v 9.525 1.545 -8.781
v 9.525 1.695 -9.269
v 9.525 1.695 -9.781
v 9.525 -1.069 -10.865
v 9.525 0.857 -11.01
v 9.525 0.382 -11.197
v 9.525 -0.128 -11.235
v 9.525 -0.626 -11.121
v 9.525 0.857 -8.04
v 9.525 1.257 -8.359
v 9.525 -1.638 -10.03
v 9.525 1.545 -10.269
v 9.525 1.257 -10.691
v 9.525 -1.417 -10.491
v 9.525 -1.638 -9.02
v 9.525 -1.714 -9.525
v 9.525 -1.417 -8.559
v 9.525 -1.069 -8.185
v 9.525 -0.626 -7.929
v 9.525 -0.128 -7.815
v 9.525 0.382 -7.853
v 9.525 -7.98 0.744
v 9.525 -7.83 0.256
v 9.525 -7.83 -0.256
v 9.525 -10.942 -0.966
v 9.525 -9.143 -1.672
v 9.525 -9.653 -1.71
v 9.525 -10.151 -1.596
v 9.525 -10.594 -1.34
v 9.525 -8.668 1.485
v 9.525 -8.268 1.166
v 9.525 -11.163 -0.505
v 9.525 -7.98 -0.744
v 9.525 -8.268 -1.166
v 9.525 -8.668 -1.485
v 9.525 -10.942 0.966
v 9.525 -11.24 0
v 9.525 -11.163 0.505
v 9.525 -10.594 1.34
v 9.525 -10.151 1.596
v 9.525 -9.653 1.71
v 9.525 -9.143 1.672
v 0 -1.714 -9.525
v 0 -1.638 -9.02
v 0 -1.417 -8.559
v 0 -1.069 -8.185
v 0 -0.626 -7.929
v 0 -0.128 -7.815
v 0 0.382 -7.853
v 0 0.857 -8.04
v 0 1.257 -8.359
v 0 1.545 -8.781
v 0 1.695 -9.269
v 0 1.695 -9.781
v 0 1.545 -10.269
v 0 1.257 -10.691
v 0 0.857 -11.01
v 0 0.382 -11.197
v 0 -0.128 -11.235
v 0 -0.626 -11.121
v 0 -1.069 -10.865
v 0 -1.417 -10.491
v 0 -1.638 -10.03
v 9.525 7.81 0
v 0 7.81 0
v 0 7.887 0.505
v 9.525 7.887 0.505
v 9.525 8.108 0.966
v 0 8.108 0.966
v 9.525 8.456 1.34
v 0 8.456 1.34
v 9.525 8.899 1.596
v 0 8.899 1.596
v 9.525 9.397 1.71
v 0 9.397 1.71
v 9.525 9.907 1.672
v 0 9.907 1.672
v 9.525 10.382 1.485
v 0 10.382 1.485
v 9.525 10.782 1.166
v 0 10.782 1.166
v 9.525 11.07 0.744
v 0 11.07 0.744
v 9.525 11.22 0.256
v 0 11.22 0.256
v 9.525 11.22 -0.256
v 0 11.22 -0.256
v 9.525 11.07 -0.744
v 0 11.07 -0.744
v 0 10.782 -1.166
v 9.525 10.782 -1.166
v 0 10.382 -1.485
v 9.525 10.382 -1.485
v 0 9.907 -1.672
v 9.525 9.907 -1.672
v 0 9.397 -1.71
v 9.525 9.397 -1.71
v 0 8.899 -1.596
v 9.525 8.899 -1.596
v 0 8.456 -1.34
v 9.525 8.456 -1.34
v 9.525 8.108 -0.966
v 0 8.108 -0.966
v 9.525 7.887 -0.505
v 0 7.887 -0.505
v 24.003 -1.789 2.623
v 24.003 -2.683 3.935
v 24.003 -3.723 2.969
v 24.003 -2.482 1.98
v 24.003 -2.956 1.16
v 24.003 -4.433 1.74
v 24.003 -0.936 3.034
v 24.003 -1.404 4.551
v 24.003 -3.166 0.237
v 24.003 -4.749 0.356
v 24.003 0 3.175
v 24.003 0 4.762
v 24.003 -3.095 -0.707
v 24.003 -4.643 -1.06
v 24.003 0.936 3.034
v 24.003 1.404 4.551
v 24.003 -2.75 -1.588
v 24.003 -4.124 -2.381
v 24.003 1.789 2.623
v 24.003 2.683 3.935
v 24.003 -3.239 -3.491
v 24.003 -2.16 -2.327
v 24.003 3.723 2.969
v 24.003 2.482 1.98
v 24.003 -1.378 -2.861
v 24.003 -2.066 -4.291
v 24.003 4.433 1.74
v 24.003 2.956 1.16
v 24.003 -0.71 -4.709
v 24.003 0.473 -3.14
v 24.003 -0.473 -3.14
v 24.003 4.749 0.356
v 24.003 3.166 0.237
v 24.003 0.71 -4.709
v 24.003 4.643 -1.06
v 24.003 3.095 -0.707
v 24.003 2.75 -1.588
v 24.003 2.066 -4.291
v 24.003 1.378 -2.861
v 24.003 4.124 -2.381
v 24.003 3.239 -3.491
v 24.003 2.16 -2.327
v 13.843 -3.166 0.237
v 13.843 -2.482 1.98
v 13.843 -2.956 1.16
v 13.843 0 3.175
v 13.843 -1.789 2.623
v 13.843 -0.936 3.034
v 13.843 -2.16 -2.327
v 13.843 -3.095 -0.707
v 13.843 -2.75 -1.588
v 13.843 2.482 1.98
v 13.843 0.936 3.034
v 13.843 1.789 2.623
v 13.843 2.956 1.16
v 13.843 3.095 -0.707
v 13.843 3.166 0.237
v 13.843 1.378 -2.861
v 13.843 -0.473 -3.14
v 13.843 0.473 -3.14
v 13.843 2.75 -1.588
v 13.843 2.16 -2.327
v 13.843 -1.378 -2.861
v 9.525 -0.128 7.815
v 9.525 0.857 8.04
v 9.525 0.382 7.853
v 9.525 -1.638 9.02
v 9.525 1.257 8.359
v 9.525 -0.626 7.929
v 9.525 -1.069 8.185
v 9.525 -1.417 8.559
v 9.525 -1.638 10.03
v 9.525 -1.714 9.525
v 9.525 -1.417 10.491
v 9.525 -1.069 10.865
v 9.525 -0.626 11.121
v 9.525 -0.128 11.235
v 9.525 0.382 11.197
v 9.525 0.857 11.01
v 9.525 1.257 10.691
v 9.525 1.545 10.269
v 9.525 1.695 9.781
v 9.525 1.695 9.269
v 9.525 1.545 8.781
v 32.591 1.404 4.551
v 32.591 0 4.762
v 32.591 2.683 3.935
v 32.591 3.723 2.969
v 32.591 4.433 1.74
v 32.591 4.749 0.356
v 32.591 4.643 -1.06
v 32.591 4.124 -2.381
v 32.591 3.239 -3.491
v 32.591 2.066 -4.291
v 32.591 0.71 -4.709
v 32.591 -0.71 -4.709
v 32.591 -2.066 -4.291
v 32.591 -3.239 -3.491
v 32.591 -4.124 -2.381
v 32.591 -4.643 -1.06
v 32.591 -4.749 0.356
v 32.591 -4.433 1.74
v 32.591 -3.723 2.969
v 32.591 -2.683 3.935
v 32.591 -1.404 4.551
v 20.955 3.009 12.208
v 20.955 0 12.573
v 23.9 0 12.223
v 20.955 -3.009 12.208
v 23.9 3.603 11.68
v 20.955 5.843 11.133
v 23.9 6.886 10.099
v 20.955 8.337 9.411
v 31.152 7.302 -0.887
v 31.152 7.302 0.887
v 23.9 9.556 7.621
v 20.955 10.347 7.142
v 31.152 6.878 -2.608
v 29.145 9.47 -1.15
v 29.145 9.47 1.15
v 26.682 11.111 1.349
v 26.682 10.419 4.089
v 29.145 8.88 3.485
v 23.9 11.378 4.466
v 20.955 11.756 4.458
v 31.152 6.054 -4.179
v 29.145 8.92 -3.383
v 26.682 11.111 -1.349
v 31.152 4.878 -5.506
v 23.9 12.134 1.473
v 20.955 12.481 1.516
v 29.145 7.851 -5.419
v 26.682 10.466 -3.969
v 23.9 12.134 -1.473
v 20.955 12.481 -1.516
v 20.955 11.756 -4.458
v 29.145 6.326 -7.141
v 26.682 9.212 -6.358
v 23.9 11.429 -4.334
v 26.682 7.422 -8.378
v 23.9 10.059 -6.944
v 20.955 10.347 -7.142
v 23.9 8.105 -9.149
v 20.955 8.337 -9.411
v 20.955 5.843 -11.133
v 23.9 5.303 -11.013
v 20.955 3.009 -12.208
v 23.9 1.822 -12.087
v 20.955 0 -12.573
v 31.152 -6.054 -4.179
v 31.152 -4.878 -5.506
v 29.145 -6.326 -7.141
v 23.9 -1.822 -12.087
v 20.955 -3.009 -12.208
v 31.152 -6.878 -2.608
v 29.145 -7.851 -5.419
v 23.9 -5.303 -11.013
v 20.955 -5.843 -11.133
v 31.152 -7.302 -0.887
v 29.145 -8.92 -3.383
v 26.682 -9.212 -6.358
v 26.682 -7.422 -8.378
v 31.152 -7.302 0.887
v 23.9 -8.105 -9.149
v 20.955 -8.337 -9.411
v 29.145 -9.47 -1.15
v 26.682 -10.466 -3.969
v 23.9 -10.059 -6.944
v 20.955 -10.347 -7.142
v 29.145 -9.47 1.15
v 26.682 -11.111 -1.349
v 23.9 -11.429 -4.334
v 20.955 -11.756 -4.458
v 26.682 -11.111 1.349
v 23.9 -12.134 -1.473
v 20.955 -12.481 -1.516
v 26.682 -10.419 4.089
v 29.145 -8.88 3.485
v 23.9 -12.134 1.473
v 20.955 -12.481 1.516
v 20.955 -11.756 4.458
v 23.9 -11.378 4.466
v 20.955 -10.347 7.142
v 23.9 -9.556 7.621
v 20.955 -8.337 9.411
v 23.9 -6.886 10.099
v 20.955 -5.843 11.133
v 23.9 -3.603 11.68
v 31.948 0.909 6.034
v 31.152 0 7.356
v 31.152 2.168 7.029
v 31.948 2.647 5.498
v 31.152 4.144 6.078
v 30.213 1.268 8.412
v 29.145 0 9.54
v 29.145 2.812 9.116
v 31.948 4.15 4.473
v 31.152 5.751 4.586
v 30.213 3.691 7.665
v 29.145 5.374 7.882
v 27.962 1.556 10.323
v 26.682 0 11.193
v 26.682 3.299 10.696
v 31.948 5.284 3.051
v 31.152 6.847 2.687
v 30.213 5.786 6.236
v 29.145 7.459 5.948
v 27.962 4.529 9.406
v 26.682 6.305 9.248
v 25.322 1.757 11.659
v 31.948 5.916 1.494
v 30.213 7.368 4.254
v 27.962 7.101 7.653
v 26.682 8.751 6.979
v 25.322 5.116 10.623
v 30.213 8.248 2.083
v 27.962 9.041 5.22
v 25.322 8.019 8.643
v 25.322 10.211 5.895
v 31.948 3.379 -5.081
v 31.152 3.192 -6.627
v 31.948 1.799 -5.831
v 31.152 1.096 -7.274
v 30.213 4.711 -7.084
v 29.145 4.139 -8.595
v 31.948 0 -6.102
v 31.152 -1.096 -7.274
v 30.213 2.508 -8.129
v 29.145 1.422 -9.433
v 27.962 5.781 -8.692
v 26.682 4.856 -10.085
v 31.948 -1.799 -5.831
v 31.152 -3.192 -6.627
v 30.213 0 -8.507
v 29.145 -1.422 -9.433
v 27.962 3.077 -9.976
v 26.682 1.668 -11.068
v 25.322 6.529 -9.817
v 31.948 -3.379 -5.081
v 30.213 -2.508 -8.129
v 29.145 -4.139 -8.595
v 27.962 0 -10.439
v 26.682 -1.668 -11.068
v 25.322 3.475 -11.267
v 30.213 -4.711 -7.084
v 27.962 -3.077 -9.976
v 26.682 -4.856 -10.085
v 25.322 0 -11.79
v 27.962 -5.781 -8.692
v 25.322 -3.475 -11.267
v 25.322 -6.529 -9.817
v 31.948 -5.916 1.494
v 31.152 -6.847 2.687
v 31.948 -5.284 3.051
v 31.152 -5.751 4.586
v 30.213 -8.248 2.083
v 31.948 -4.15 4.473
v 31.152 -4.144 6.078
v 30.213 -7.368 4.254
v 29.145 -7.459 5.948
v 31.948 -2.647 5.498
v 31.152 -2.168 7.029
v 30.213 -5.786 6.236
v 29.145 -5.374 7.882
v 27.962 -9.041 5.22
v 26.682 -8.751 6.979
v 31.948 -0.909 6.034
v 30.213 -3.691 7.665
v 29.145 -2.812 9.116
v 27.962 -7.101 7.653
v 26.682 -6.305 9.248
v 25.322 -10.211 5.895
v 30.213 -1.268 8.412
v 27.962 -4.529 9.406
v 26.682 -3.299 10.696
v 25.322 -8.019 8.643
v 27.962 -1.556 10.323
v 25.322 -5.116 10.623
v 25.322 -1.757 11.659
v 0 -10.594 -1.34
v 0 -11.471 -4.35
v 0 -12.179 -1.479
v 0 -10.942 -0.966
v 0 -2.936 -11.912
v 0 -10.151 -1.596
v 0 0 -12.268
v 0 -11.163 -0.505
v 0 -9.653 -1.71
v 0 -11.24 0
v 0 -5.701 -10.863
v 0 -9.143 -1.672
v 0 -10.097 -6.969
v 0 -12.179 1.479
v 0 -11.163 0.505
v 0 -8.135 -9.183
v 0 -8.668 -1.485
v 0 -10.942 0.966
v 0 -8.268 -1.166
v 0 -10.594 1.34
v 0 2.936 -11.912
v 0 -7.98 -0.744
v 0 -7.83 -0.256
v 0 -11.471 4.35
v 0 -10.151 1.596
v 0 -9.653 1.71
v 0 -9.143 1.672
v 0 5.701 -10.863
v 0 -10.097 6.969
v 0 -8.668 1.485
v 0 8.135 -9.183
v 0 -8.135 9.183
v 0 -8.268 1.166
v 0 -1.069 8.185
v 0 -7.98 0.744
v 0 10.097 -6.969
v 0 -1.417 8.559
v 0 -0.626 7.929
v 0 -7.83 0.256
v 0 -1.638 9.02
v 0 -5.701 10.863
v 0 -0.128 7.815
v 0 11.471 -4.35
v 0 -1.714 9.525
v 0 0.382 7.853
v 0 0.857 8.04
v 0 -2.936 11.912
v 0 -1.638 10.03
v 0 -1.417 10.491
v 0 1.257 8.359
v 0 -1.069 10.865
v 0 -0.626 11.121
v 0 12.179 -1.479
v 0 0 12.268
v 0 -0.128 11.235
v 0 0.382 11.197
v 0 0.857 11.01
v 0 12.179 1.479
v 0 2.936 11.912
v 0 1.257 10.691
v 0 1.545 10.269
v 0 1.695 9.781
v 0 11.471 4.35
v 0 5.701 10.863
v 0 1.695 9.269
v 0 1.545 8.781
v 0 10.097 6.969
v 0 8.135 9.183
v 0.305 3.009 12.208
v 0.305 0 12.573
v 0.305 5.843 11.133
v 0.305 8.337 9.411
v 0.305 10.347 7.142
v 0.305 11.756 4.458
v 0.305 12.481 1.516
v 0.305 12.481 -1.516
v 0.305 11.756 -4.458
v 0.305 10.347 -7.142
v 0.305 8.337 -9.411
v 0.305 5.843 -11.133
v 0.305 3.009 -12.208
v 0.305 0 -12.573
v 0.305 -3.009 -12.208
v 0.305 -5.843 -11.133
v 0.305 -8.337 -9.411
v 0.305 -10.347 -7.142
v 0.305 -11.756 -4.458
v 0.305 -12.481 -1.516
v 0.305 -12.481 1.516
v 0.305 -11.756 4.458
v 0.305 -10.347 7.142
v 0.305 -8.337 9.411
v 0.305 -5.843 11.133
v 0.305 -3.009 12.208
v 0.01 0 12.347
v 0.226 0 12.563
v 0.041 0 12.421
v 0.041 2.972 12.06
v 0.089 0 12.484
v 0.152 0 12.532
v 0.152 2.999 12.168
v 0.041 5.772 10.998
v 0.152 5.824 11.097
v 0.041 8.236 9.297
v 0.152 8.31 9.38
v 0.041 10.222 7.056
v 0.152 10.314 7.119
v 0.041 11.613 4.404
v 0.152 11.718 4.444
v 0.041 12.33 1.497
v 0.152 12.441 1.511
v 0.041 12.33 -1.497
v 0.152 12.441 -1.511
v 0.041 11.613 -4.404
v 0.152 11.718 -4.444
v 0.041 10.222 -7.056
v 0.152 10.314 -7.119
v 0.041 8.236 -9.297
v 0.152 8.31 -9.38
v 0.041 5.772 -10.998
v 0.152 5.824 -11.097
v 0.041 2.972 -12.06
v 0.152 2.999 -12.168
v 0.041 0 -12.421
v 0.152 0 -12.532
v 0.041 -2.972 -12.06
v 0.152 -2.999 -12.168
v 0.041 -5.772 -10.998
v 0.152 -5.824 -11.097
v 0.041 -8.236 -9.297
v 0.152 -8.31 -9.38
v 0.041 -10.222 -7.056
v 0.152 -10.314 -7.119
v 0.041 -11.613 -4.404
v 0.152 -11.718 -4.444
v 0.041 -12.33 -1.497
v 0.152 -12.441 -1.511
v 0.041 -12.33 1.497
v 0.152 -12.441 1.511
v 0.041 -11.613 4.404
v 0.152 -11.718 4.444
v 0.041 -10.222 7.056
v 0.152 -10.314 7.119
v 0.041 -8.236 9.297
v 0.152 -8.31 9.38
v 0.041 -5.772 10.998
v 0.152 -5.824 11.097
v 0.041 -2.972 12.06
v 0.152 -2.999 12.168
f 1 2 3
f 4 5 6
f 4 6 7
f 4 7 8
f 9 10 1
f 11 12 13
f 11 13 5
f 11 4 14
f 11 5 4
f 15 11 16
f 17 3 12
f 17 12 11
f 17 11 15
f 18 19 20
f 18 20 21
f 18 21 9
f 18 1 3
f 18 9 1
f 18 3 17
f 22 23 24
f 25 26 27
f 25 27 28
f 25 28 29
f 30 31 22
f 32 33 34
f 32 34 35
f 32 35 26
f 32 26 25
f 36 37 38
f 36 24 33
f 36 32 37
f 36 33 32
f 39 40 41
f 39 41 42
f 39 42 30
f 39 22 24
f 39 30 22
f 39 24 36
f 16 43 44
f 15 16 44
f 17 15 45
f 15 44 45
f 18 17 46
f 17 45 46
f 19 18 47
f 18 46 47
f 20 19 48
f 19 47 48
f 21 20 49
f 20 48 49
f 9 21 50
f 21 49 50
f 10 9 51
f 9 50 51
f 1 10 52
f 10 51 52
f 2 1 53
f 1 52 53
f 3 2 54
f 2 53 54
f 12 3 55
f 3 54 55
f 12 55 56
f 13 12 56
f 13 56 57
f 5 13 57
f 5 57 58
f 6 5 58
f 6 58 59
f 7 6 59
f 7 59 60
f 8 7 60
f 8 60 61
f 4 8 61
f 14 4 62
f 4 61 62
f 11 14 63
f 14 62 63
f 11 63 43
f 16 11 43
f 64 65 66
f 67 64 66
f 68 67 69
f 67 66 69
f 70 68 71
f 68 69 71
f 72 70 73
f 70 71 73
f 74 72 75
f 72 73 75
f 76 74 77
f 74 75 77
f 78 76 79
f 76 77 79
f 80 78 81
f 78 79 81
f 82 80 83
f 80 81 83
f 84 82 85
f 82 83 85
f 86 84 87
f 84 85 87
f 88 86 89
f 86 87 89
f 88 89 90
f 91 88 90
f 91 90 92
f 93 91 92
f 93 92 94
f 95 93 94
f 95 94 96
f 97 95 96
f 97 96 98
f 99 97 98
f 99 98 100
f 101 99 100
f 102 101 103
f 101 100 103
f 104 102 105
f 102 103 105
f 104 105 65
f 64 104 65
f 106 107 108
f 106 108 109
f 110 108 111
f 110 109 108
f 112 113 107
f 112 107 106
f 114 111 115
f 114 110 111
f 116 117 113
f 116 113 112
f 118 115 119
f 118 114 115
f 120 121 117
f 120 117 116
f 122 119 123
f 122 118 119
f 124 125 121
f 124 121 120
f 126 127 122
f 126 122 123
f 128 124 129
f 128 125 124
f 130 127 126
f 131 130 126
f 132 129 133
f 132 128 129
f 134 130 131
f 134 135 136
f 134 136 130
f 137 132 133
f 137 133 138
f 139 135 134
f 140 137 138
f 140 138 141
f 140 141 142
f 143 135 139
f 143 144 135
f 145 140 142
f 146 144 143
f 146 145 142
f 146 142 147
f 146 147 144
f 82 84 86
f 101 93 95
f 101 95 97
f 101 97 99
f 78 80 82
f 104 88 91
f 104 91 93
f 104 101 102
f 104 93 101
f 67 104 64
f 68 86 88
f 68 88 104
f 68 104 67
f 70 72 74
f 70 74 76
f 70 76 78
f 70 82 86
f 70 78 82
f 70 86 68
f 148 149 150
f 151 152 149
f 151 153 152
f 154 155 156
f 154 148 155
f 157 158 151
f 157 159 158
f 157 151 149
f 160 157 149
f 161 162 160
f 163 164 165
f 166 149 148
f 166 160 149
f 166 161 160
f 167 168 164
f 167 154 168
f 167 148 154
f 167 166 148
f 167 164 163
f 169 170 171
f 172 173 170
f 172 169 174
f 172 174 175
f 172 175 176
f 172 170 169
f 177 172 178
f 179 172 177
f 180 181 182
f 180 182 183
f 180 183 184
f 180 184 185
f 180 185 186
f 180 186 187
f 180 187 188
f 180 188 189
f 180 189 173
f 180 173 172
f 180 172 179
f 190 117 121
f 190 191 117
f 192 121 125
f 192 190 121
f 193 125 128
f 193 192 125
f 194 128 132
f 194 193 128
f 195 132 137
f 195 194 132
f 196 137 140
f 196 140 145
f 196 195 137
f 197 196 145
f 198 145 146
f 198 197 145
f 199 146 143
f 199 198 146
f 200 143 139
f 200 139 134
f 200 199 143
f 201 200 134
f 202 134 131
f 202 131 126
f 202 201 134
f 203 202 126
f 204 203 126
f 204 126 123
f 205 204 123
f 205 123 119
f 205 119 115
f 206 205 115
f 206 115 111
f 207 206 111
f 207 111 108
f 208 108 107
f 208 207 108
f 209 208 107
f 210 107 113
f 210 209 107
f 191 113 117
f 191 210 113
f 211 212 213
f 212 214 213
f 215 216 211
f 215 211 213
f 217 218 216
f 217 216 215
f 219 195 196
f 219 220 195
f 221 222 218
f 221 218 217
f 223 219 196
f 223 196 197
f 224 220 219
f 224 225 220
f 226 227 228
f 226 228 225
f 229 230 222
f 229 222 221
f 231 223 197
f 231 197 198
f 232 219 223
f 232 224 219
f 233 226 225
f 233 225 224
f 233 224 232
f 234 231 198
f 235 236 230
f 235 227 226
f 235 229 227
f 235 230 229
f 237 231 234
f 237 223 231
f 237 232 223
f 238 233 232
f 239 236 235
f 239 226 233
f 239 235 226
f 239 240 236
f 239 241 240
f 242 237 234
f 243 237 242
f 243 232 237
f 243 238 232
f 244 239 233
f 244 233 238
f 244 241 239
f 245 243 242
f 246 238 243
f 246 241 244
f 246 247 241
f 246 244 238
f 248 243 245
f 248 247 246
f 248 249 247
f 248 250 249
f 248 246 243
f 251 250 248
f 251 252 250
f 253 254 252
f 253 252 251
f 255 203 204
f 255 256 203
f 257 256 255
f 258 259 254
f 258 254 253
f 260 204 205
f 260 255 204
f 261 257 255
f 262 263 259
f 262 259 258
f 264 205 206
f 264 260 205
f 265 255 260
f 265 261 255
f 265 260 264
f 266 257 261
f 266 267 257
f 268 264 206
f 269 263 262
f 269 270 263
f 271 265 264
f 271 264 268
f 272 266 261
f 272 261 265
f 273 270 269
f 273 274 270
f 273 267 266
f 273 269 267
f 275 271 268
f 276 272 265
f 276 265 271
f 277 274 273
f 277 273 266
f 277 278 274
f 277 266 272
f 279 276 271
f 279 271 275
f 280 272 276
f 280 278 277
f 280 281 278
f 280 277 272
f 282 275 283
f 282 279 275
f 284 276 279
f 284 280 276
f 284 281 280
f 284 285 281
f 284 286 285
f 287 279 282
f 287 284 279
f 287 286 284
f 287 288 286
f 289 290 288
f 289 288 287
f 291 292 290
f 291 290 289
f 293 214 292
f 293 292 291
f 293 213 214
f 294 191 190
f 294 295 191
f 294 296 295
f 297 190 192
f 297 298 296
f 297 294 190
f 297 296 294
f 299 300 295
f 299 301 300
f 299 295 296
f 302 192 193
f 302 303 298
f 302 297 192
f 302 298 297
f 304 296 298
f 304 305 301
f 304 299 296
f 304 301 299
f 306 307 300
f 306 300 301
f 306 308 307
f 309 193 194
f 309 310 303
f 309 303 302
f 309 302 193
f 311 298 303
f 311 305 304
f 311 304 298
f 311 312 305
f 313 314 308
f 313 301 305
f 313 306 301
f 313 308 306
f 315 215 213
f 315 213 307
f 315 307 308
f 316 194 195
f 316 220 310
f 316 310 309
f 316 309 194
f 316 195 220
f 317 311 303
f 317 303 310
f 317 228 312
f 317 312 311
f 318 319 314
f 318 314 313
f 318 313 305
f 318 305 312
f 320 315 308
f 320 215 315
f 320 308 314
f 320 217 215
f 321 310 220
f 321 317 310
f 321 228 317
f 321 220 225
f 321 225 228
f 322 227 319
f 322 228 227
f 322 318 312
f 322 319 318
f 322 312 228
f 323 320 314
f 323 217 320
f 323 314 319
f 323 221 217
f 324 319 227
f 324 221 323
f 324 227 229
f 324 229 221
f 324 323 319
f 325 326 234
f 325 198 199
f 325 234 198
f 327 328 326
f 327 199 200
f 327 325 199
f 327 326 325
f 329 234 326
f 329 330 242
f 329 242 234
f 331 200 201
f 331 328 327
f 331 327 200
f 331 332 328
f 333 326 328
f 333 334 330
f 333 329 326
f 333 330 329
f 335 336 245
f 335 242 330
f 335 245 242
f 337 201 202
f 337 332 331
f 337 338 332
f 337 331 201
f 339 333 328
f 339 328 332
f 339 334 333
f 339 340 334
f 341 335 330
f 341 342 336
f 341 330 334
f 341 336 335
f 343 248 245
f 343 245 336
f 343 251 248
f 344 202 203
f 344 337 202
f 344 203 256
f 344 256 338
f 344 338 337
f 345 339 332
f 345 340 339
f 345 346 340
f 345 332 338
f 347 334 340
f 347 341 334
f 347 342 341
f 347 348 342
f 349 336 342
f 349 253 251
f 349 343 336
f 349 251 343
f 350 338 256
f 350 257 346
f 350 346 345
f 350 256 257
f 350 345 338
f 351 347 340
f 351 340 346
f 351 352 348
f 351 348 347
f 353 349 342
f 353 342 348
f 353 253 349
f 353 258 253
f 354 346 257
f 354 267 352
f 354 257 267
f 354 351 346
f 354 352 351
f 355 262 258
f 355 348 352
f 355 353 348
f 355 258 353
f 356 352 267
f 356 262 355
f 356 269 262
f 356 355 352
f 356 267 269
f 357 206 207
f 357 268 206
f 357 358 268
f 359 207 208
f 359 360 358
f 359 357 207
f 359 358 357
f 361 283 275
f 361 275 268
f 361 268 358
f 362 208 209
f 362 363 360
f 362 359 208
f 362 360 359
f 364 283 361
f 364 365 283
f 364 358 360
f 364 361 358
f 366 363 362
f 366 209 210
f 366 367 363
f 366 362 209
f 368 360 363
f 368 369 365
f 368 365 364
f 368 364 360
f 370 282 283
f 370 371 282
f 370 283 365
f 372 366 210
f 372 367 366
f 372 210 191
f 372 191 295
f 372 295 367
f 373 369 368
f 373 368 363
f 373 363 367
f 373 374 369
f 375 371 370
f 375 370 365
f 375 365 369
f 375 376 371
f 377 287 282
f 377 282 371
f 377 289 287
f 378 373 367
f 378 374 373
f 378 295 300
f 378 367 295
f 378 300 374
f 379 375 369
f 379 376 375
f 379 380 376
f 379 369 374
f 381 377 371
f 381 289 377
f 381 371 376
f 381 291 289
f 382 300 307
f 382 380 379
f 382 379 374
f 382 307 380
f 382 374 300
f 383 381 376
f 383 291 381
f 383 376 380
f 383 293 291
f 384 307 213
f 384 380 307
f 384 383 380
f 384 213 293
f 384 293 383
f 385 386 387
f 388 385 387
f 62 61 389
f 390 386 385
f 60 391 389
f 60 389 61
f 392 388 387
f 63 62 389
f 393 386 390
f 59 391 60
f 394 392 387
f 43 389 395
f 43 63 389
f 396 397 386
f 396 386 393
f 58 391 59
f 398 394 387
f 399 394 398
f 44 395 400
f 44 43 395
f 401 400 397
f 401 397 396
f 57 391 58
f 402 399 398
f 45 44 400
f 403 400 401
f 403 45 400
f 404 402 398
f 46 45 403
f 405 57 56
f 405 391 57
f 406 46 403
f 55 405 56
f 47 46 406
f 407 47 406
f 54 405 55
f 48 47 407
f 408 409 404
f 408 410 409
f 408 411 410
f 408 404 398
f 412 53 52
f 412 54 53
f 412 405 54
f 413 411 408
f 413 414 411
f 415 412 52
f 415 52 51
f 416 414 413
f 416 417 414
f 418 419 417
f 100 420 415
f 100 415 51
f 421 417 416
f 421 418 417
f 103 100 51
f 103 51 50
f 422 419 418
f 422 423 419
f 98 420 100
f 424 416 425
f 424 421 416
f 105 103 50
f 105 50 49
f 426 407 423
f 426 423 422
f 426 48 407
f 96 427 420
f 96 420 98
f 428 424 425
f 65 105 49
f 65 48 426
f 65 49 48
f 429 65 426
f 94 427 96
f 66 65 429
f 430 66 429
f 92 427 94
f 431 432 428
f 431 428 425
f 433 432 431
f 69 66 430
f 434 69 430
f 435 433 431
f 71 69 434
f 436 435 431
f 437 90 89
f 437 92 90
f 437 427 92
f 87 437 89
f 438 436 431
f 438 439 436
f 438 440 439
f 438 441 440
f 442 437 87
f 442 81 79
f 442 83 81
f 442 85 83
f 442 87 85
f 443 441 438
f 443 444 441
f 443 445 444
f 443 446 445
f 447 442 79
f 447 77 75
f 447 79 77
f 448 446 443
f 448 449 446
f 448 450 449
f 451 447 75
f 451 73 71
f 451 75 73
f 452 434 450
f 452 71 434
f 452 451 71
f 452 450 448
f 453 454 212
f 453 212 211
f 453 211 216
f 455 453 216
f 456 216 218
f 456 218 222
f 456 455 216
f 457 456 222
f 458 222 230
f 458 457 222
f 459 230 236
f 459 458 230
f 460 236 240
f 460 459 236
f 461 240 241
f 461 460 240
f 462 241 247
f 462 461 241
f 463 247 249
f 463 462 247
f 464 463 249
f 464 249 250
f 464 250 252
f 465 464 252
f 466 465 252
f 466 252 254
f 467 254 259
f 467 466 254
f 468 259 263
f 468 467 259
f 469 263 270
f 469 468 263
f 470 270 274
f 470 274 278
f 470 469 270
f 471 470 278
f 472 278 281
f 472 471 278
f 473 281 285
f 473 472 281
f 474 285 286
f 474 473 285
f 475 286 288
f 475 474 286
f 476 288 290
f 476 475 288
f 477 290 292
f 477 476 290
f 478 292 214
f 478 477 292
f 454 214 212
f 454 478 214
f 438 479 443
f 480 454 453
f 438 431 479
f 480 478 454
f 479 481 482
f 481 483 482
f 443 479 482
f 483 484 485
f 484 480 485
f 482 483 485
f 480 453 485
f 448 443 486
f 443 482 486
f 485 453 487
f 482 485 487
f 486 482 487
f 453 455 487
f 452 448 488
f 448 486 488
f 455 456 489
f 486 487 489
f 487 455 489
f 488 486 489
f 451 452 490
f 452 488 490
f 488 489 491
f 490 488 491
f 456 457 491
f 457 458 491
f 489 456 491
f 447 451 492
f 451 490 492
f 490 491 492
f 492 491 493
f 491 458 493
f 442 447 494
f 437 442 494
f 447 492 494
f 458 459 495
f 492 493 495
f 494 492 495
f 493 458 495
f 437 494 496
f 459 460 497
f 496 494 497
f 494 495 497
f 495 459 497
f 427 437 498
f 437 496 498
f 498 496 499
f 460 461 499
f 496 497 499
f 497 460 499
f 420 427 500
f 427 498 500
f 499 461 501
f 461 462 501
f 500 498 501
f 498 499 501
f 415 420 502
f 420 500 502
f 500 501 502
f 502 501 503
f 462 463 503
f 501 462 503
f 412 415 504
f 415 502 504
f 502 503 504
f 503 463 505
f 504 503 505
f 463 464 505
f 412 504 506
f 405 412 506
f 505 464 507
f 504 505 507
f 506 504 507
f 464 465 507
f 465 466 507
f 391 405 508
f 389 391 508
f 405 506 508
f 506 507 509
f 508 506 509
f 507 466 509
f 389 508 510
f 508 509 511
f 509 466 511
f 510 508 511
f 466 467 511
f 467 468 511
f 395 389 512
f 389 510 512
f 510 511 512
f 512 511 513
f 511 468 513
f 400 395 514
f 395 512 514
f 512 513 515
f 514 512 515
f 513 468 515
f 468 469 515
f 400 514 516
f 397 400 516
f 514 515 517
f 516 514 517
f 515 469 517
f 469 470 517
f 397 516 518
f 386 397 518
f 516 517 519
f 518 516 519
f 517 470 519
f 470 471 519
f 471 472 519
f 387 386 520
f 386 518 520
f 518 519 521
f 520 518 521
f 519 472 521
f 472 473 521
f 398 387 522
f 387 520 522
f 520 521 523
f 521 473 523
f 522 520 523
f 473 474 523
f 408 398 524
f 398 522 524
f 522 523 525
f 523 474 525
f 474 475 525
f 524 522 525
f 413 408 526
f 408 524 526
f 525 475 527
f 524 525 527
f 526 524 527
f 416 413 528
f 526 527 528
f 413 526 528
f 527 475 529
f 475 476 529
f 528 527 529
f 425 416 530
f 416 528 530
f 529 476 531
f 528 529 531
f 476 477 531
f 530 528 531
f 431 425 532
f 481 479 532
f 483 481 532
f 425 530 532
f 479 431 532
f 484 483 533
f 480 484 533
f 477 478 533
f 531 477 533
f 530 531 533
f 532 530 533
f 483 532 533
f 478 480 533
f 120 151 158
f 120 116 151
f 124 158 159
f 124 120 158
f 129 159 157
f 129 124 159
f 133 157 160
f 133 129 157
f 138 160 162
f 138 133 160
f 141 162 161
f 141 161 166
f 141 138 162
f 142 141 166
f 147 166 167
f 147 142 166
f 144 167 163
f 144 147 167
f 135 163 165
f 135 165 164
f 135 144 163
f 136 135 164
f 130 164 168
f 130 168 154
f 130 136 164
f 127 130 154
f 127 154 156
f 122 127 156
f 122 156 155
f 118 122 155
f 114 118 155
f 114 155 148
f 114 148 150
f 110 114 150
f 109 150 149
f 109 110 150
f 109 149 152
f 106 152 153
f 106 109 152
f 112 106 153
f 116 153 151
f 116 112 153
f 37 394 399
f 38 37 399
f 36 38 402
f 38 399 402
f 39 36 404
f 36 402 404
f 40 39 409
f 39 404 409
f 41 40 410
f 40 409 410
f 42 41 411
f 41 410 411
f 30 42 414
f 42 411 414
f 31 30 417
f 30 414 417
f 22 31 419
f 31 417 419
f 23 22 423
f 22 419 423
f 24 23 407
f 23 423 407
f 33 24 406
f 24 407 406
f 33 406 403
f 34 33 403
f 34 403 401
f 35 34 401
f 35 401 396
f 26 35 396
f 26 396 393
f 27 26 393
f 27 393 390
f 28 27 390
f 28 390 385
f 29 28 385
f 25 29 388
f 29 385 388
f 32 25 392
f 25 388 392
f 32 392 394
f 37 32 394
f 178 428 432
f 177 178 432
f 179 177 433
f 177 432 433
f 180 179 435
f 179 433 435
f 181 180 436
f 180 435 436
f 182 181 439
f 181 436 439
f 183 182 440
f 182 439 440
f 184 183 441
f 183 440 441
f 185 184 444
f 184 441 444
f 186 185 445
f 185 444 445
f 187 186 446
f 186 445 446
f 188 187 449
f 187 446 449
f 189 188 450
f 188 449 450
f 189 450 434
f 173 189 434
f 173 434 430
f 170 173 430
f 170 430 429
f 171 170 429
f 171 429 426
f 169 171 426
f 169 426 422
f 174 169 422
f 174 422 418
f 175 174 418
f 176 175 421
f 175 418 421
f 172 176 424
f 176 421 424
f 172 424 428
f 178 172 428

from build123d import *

# Parameters (mm, degrees)
F2_R     = 1.7145
F3_DEPTH = 9.525
F4_R     = 0.3048


with BuildPart() as f1:
    # F0 (on Front) → F1 (revolve)
    with BuildSketch(Plane.XZ):
        with BuildLine():
            Line((0, 12.573), (0, 0))
            Line((0, 0), (13.843, 0))
            Line((13.843, 0), (13.843, 3.175))
            Line((13.843, 3.175), (24.003, 3.175))
            Line((24.003, 3.175), (24.003, 4.7625))
            Line((24.003, 4.7625), (32.591104, 4.7625))
            ThreePointArc((32.591104, 4.7625), (27.96219, 10.43933), (20.955, 12.573))
            Line((20.955, 12.573), (0, 12.573))
        make_face()
    revolve(axis=Axis((6.9215, 0, 0), (-1, 0, 0)))

    # F2 (on face) → F3 (cut)
    with BuildSketch(Plane(origin=(0, 0, 0), x_dir=(0, -1, 0), z_dir=(-1, 0, 0))):
        with Locations((0, 9.525)):
            Circle(F2_R)
        with Locations((-9.525, 0)):
            Circle(F2_R)
        with Locations((0, -9.525)):
            Circle(F2_R)
        with Locations((9.525, 0)):
            Circle(F2_R)
    extrude(amount=-F3_DEPTH, mode=Mode.SUBTRACT)

    # F4
    f4_edges = [f1.edges().sort_by_distance(p)[0] for p in [
        (0, 0, -12.573),
    ]]
    fillet(f4_edges, radius=F4_R)


solid = f1.part
